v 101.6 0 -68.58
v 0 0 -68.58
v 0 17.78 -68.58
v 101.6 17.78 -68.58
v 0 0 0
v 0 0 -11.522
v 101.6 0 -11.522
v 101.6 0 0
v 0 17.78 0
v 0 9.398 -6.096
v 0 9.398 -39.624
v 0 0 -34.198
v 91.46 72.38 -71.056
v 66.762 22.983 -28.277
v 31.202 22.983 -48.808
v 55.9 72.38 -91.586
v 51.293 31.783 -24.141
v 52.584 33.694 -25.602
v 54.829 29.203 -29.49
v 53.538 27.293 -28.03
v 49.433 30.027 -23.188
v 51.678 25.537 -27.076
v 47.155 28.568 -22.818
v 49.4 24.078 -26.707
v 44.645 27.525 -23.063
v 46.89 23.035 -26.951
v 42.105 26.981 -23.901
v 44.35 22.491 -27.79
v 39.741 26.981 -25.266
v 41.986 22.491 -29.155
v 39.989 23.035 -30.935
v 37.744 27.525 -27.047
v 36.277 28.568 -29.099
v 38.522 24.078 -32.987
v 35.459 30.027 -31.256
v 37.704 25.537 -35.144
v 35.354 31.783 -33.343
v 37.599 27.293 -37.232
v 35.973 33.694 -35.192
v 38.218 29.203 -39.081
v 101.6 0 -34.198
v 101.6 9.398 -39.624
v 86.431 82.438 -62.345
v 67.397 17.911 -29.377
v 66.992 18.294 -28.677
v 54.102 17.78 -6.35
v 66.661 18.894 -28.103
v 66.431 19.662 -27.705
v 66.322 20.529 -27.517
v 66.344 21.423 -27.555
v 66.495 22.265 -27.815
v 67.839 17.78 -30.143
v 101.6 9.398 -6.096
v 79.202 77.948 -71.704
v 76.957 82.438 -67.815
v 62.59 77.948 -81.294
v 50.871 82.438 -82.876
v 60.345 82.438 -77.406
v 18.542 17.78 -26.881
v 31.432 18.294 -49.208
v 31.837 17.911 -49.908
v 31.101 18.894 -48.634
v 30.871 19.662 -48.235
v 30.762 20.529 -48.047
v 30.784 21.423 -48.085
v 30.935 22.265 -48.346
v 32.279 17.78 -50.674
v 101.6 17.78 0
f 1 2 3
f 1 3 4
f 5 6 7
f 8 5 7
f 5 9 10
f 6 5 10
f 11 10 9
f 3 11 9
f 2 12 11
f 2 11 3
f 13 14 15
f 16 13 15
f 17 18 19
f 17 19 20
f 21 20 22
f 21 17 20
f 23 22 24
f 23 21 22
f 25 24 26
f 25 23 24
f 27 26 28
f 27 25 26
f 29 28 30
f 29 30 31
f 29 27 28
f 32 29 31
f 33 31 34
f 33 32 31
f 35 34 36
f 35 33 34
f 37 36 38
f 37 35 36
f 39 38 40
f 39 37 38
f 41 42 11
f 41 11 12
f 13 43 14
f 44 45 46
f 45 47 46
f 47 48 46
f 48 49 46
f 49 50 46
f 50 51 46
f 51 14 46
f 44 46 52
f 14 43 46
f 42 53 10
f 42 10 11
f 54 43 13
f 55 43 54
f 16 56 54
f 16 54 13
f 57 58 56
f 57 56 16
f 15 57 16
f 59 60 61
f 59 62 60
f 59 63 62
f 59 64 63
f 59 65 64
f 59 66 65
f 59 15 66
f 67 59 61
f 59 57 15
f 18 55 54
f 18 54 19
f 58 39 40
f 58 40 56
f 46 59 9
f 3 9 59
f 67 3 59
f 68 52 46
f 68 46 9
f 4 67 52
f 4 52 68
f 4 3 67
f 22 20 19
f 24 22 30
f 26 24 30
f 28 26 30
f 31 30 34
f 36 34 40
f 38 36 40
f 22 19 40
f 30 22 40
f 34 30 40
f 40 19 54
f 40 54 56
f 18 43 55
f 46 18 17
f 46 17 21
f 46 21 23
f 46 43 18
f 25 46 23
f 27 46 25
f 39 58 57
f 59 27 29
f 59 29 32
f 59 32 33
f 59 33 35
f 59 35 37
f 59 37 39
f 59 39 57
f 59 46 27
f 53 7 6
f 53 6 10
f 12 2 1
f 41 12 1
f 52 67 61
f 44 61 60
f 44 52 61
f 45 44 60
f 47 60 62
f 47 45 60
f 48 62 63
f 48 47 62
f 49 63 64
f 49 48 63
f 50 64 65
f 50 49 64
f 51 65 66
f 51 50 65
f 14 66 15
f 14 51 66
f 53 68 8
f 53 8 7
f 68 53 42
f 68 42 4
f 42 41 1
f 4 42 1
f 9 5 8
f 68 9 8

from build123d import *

# Parameters (mm, degrees)
CROQUIS1_W              = 101.6
CROQUIS1_H              = 68.58
SALIENTE_EXTRUIR1_DEPTH = 17.78
CROQUIS4_W              = 41.061151145
CROQUIS4_H              = 91.44
SALIENTE_EXTRUIR2_DEPTH = 14.224
CORTAR_EXTRUIR1_DEPTH   = 6.35
REDONDEO2_R             = 3.048
CORTAR_EXTRUIR2_DEPTH   = 160.707882909


with BuildPart() as part:
    # Croquis1 → Saliente-Extruir1 (new body)
    with BuildSketch(Plane(origin=(0, 0, 0), x_dir=(1, 0, 0), z_dir=(0, 1, 0))):
        with Locations((50.8, 34.29)):
            Rectangle(CROQUIS1_W, CROQUIS1_H)
    extrude(amount=SALIENTE_EXTRUIR1_DEPTH)

    # Croquis4 → Saliente-Extruir2 (add)
    with BuildSketch(Plane(origin=(3.692565329, -7.385130657, -6.395710759), x_dir=(-0.8660254037844416, 0, -0.49999999999999484), z_dir=(-0.3535533905932708, 0.7071067811865462, 0.6123724356957978))):
        with Locations((-23.148130824, -81.308869074)):
            Rectangle(CROQUIS4_W, CROQUIS4_H)
    extrude(amount=-SALIENTE_EXTRUIR2_DEPTH)

    # Croquis5 → Cortar-Extruir1 (cut)
    with BuildSketch(Plane(origin=(3.692565329, -7.385130657, -6.395710759), x_dir=(0.9354143466934866, 0.2672612419124214, 0.23145502494313694), z_dir=(-0.35355339059327084, 0.707106781186546, 0.612372435695798))):
        with BuildLine():
            Line((60.564352246, 112.481567013), (78.322456444, 105.231851332))
            Line((78.322456444, 105.231851332), (52.267557185, 41.410642848))
            ThreePointArc((52.267557185, 41.410642848), (39.763647245, 36.156448589), (34.509452987, 48.660358529))
            Line((34.509452987, 48.660358529), (60.564352246, 112.481567013))
        make_face()
    extrude(amount=-CORTAR_EXTRUIR1_DEPTH, mode=Mode.SUBTRACT)

    # Redondeo2
    redondeo2_edges = [part.edges().sort_by_distance(p)[0] for p in [
        (46.379886856, 17.78, -34.036058837),
    ]]
    fillet(redondeo2_edges, radius=REDONDEO2_R)

    # Croquis6 → Cortar-Extruir2 (cut, through all)
    with BuildSketch(Plane(origin=(101.6, 0, 0), x_dir=(0, 0, -1), z_dir=(1, 0, 0))):
        Polygon((6.096, 9.398), (39.624, 9.398), (34.19806217, 0), (11.52193783, 0), align=None)
    extrude(amount=-CORTAR_EXTRUIR2_DEPTH, mode=Mode.SUBTRACT)


solid = part.part
